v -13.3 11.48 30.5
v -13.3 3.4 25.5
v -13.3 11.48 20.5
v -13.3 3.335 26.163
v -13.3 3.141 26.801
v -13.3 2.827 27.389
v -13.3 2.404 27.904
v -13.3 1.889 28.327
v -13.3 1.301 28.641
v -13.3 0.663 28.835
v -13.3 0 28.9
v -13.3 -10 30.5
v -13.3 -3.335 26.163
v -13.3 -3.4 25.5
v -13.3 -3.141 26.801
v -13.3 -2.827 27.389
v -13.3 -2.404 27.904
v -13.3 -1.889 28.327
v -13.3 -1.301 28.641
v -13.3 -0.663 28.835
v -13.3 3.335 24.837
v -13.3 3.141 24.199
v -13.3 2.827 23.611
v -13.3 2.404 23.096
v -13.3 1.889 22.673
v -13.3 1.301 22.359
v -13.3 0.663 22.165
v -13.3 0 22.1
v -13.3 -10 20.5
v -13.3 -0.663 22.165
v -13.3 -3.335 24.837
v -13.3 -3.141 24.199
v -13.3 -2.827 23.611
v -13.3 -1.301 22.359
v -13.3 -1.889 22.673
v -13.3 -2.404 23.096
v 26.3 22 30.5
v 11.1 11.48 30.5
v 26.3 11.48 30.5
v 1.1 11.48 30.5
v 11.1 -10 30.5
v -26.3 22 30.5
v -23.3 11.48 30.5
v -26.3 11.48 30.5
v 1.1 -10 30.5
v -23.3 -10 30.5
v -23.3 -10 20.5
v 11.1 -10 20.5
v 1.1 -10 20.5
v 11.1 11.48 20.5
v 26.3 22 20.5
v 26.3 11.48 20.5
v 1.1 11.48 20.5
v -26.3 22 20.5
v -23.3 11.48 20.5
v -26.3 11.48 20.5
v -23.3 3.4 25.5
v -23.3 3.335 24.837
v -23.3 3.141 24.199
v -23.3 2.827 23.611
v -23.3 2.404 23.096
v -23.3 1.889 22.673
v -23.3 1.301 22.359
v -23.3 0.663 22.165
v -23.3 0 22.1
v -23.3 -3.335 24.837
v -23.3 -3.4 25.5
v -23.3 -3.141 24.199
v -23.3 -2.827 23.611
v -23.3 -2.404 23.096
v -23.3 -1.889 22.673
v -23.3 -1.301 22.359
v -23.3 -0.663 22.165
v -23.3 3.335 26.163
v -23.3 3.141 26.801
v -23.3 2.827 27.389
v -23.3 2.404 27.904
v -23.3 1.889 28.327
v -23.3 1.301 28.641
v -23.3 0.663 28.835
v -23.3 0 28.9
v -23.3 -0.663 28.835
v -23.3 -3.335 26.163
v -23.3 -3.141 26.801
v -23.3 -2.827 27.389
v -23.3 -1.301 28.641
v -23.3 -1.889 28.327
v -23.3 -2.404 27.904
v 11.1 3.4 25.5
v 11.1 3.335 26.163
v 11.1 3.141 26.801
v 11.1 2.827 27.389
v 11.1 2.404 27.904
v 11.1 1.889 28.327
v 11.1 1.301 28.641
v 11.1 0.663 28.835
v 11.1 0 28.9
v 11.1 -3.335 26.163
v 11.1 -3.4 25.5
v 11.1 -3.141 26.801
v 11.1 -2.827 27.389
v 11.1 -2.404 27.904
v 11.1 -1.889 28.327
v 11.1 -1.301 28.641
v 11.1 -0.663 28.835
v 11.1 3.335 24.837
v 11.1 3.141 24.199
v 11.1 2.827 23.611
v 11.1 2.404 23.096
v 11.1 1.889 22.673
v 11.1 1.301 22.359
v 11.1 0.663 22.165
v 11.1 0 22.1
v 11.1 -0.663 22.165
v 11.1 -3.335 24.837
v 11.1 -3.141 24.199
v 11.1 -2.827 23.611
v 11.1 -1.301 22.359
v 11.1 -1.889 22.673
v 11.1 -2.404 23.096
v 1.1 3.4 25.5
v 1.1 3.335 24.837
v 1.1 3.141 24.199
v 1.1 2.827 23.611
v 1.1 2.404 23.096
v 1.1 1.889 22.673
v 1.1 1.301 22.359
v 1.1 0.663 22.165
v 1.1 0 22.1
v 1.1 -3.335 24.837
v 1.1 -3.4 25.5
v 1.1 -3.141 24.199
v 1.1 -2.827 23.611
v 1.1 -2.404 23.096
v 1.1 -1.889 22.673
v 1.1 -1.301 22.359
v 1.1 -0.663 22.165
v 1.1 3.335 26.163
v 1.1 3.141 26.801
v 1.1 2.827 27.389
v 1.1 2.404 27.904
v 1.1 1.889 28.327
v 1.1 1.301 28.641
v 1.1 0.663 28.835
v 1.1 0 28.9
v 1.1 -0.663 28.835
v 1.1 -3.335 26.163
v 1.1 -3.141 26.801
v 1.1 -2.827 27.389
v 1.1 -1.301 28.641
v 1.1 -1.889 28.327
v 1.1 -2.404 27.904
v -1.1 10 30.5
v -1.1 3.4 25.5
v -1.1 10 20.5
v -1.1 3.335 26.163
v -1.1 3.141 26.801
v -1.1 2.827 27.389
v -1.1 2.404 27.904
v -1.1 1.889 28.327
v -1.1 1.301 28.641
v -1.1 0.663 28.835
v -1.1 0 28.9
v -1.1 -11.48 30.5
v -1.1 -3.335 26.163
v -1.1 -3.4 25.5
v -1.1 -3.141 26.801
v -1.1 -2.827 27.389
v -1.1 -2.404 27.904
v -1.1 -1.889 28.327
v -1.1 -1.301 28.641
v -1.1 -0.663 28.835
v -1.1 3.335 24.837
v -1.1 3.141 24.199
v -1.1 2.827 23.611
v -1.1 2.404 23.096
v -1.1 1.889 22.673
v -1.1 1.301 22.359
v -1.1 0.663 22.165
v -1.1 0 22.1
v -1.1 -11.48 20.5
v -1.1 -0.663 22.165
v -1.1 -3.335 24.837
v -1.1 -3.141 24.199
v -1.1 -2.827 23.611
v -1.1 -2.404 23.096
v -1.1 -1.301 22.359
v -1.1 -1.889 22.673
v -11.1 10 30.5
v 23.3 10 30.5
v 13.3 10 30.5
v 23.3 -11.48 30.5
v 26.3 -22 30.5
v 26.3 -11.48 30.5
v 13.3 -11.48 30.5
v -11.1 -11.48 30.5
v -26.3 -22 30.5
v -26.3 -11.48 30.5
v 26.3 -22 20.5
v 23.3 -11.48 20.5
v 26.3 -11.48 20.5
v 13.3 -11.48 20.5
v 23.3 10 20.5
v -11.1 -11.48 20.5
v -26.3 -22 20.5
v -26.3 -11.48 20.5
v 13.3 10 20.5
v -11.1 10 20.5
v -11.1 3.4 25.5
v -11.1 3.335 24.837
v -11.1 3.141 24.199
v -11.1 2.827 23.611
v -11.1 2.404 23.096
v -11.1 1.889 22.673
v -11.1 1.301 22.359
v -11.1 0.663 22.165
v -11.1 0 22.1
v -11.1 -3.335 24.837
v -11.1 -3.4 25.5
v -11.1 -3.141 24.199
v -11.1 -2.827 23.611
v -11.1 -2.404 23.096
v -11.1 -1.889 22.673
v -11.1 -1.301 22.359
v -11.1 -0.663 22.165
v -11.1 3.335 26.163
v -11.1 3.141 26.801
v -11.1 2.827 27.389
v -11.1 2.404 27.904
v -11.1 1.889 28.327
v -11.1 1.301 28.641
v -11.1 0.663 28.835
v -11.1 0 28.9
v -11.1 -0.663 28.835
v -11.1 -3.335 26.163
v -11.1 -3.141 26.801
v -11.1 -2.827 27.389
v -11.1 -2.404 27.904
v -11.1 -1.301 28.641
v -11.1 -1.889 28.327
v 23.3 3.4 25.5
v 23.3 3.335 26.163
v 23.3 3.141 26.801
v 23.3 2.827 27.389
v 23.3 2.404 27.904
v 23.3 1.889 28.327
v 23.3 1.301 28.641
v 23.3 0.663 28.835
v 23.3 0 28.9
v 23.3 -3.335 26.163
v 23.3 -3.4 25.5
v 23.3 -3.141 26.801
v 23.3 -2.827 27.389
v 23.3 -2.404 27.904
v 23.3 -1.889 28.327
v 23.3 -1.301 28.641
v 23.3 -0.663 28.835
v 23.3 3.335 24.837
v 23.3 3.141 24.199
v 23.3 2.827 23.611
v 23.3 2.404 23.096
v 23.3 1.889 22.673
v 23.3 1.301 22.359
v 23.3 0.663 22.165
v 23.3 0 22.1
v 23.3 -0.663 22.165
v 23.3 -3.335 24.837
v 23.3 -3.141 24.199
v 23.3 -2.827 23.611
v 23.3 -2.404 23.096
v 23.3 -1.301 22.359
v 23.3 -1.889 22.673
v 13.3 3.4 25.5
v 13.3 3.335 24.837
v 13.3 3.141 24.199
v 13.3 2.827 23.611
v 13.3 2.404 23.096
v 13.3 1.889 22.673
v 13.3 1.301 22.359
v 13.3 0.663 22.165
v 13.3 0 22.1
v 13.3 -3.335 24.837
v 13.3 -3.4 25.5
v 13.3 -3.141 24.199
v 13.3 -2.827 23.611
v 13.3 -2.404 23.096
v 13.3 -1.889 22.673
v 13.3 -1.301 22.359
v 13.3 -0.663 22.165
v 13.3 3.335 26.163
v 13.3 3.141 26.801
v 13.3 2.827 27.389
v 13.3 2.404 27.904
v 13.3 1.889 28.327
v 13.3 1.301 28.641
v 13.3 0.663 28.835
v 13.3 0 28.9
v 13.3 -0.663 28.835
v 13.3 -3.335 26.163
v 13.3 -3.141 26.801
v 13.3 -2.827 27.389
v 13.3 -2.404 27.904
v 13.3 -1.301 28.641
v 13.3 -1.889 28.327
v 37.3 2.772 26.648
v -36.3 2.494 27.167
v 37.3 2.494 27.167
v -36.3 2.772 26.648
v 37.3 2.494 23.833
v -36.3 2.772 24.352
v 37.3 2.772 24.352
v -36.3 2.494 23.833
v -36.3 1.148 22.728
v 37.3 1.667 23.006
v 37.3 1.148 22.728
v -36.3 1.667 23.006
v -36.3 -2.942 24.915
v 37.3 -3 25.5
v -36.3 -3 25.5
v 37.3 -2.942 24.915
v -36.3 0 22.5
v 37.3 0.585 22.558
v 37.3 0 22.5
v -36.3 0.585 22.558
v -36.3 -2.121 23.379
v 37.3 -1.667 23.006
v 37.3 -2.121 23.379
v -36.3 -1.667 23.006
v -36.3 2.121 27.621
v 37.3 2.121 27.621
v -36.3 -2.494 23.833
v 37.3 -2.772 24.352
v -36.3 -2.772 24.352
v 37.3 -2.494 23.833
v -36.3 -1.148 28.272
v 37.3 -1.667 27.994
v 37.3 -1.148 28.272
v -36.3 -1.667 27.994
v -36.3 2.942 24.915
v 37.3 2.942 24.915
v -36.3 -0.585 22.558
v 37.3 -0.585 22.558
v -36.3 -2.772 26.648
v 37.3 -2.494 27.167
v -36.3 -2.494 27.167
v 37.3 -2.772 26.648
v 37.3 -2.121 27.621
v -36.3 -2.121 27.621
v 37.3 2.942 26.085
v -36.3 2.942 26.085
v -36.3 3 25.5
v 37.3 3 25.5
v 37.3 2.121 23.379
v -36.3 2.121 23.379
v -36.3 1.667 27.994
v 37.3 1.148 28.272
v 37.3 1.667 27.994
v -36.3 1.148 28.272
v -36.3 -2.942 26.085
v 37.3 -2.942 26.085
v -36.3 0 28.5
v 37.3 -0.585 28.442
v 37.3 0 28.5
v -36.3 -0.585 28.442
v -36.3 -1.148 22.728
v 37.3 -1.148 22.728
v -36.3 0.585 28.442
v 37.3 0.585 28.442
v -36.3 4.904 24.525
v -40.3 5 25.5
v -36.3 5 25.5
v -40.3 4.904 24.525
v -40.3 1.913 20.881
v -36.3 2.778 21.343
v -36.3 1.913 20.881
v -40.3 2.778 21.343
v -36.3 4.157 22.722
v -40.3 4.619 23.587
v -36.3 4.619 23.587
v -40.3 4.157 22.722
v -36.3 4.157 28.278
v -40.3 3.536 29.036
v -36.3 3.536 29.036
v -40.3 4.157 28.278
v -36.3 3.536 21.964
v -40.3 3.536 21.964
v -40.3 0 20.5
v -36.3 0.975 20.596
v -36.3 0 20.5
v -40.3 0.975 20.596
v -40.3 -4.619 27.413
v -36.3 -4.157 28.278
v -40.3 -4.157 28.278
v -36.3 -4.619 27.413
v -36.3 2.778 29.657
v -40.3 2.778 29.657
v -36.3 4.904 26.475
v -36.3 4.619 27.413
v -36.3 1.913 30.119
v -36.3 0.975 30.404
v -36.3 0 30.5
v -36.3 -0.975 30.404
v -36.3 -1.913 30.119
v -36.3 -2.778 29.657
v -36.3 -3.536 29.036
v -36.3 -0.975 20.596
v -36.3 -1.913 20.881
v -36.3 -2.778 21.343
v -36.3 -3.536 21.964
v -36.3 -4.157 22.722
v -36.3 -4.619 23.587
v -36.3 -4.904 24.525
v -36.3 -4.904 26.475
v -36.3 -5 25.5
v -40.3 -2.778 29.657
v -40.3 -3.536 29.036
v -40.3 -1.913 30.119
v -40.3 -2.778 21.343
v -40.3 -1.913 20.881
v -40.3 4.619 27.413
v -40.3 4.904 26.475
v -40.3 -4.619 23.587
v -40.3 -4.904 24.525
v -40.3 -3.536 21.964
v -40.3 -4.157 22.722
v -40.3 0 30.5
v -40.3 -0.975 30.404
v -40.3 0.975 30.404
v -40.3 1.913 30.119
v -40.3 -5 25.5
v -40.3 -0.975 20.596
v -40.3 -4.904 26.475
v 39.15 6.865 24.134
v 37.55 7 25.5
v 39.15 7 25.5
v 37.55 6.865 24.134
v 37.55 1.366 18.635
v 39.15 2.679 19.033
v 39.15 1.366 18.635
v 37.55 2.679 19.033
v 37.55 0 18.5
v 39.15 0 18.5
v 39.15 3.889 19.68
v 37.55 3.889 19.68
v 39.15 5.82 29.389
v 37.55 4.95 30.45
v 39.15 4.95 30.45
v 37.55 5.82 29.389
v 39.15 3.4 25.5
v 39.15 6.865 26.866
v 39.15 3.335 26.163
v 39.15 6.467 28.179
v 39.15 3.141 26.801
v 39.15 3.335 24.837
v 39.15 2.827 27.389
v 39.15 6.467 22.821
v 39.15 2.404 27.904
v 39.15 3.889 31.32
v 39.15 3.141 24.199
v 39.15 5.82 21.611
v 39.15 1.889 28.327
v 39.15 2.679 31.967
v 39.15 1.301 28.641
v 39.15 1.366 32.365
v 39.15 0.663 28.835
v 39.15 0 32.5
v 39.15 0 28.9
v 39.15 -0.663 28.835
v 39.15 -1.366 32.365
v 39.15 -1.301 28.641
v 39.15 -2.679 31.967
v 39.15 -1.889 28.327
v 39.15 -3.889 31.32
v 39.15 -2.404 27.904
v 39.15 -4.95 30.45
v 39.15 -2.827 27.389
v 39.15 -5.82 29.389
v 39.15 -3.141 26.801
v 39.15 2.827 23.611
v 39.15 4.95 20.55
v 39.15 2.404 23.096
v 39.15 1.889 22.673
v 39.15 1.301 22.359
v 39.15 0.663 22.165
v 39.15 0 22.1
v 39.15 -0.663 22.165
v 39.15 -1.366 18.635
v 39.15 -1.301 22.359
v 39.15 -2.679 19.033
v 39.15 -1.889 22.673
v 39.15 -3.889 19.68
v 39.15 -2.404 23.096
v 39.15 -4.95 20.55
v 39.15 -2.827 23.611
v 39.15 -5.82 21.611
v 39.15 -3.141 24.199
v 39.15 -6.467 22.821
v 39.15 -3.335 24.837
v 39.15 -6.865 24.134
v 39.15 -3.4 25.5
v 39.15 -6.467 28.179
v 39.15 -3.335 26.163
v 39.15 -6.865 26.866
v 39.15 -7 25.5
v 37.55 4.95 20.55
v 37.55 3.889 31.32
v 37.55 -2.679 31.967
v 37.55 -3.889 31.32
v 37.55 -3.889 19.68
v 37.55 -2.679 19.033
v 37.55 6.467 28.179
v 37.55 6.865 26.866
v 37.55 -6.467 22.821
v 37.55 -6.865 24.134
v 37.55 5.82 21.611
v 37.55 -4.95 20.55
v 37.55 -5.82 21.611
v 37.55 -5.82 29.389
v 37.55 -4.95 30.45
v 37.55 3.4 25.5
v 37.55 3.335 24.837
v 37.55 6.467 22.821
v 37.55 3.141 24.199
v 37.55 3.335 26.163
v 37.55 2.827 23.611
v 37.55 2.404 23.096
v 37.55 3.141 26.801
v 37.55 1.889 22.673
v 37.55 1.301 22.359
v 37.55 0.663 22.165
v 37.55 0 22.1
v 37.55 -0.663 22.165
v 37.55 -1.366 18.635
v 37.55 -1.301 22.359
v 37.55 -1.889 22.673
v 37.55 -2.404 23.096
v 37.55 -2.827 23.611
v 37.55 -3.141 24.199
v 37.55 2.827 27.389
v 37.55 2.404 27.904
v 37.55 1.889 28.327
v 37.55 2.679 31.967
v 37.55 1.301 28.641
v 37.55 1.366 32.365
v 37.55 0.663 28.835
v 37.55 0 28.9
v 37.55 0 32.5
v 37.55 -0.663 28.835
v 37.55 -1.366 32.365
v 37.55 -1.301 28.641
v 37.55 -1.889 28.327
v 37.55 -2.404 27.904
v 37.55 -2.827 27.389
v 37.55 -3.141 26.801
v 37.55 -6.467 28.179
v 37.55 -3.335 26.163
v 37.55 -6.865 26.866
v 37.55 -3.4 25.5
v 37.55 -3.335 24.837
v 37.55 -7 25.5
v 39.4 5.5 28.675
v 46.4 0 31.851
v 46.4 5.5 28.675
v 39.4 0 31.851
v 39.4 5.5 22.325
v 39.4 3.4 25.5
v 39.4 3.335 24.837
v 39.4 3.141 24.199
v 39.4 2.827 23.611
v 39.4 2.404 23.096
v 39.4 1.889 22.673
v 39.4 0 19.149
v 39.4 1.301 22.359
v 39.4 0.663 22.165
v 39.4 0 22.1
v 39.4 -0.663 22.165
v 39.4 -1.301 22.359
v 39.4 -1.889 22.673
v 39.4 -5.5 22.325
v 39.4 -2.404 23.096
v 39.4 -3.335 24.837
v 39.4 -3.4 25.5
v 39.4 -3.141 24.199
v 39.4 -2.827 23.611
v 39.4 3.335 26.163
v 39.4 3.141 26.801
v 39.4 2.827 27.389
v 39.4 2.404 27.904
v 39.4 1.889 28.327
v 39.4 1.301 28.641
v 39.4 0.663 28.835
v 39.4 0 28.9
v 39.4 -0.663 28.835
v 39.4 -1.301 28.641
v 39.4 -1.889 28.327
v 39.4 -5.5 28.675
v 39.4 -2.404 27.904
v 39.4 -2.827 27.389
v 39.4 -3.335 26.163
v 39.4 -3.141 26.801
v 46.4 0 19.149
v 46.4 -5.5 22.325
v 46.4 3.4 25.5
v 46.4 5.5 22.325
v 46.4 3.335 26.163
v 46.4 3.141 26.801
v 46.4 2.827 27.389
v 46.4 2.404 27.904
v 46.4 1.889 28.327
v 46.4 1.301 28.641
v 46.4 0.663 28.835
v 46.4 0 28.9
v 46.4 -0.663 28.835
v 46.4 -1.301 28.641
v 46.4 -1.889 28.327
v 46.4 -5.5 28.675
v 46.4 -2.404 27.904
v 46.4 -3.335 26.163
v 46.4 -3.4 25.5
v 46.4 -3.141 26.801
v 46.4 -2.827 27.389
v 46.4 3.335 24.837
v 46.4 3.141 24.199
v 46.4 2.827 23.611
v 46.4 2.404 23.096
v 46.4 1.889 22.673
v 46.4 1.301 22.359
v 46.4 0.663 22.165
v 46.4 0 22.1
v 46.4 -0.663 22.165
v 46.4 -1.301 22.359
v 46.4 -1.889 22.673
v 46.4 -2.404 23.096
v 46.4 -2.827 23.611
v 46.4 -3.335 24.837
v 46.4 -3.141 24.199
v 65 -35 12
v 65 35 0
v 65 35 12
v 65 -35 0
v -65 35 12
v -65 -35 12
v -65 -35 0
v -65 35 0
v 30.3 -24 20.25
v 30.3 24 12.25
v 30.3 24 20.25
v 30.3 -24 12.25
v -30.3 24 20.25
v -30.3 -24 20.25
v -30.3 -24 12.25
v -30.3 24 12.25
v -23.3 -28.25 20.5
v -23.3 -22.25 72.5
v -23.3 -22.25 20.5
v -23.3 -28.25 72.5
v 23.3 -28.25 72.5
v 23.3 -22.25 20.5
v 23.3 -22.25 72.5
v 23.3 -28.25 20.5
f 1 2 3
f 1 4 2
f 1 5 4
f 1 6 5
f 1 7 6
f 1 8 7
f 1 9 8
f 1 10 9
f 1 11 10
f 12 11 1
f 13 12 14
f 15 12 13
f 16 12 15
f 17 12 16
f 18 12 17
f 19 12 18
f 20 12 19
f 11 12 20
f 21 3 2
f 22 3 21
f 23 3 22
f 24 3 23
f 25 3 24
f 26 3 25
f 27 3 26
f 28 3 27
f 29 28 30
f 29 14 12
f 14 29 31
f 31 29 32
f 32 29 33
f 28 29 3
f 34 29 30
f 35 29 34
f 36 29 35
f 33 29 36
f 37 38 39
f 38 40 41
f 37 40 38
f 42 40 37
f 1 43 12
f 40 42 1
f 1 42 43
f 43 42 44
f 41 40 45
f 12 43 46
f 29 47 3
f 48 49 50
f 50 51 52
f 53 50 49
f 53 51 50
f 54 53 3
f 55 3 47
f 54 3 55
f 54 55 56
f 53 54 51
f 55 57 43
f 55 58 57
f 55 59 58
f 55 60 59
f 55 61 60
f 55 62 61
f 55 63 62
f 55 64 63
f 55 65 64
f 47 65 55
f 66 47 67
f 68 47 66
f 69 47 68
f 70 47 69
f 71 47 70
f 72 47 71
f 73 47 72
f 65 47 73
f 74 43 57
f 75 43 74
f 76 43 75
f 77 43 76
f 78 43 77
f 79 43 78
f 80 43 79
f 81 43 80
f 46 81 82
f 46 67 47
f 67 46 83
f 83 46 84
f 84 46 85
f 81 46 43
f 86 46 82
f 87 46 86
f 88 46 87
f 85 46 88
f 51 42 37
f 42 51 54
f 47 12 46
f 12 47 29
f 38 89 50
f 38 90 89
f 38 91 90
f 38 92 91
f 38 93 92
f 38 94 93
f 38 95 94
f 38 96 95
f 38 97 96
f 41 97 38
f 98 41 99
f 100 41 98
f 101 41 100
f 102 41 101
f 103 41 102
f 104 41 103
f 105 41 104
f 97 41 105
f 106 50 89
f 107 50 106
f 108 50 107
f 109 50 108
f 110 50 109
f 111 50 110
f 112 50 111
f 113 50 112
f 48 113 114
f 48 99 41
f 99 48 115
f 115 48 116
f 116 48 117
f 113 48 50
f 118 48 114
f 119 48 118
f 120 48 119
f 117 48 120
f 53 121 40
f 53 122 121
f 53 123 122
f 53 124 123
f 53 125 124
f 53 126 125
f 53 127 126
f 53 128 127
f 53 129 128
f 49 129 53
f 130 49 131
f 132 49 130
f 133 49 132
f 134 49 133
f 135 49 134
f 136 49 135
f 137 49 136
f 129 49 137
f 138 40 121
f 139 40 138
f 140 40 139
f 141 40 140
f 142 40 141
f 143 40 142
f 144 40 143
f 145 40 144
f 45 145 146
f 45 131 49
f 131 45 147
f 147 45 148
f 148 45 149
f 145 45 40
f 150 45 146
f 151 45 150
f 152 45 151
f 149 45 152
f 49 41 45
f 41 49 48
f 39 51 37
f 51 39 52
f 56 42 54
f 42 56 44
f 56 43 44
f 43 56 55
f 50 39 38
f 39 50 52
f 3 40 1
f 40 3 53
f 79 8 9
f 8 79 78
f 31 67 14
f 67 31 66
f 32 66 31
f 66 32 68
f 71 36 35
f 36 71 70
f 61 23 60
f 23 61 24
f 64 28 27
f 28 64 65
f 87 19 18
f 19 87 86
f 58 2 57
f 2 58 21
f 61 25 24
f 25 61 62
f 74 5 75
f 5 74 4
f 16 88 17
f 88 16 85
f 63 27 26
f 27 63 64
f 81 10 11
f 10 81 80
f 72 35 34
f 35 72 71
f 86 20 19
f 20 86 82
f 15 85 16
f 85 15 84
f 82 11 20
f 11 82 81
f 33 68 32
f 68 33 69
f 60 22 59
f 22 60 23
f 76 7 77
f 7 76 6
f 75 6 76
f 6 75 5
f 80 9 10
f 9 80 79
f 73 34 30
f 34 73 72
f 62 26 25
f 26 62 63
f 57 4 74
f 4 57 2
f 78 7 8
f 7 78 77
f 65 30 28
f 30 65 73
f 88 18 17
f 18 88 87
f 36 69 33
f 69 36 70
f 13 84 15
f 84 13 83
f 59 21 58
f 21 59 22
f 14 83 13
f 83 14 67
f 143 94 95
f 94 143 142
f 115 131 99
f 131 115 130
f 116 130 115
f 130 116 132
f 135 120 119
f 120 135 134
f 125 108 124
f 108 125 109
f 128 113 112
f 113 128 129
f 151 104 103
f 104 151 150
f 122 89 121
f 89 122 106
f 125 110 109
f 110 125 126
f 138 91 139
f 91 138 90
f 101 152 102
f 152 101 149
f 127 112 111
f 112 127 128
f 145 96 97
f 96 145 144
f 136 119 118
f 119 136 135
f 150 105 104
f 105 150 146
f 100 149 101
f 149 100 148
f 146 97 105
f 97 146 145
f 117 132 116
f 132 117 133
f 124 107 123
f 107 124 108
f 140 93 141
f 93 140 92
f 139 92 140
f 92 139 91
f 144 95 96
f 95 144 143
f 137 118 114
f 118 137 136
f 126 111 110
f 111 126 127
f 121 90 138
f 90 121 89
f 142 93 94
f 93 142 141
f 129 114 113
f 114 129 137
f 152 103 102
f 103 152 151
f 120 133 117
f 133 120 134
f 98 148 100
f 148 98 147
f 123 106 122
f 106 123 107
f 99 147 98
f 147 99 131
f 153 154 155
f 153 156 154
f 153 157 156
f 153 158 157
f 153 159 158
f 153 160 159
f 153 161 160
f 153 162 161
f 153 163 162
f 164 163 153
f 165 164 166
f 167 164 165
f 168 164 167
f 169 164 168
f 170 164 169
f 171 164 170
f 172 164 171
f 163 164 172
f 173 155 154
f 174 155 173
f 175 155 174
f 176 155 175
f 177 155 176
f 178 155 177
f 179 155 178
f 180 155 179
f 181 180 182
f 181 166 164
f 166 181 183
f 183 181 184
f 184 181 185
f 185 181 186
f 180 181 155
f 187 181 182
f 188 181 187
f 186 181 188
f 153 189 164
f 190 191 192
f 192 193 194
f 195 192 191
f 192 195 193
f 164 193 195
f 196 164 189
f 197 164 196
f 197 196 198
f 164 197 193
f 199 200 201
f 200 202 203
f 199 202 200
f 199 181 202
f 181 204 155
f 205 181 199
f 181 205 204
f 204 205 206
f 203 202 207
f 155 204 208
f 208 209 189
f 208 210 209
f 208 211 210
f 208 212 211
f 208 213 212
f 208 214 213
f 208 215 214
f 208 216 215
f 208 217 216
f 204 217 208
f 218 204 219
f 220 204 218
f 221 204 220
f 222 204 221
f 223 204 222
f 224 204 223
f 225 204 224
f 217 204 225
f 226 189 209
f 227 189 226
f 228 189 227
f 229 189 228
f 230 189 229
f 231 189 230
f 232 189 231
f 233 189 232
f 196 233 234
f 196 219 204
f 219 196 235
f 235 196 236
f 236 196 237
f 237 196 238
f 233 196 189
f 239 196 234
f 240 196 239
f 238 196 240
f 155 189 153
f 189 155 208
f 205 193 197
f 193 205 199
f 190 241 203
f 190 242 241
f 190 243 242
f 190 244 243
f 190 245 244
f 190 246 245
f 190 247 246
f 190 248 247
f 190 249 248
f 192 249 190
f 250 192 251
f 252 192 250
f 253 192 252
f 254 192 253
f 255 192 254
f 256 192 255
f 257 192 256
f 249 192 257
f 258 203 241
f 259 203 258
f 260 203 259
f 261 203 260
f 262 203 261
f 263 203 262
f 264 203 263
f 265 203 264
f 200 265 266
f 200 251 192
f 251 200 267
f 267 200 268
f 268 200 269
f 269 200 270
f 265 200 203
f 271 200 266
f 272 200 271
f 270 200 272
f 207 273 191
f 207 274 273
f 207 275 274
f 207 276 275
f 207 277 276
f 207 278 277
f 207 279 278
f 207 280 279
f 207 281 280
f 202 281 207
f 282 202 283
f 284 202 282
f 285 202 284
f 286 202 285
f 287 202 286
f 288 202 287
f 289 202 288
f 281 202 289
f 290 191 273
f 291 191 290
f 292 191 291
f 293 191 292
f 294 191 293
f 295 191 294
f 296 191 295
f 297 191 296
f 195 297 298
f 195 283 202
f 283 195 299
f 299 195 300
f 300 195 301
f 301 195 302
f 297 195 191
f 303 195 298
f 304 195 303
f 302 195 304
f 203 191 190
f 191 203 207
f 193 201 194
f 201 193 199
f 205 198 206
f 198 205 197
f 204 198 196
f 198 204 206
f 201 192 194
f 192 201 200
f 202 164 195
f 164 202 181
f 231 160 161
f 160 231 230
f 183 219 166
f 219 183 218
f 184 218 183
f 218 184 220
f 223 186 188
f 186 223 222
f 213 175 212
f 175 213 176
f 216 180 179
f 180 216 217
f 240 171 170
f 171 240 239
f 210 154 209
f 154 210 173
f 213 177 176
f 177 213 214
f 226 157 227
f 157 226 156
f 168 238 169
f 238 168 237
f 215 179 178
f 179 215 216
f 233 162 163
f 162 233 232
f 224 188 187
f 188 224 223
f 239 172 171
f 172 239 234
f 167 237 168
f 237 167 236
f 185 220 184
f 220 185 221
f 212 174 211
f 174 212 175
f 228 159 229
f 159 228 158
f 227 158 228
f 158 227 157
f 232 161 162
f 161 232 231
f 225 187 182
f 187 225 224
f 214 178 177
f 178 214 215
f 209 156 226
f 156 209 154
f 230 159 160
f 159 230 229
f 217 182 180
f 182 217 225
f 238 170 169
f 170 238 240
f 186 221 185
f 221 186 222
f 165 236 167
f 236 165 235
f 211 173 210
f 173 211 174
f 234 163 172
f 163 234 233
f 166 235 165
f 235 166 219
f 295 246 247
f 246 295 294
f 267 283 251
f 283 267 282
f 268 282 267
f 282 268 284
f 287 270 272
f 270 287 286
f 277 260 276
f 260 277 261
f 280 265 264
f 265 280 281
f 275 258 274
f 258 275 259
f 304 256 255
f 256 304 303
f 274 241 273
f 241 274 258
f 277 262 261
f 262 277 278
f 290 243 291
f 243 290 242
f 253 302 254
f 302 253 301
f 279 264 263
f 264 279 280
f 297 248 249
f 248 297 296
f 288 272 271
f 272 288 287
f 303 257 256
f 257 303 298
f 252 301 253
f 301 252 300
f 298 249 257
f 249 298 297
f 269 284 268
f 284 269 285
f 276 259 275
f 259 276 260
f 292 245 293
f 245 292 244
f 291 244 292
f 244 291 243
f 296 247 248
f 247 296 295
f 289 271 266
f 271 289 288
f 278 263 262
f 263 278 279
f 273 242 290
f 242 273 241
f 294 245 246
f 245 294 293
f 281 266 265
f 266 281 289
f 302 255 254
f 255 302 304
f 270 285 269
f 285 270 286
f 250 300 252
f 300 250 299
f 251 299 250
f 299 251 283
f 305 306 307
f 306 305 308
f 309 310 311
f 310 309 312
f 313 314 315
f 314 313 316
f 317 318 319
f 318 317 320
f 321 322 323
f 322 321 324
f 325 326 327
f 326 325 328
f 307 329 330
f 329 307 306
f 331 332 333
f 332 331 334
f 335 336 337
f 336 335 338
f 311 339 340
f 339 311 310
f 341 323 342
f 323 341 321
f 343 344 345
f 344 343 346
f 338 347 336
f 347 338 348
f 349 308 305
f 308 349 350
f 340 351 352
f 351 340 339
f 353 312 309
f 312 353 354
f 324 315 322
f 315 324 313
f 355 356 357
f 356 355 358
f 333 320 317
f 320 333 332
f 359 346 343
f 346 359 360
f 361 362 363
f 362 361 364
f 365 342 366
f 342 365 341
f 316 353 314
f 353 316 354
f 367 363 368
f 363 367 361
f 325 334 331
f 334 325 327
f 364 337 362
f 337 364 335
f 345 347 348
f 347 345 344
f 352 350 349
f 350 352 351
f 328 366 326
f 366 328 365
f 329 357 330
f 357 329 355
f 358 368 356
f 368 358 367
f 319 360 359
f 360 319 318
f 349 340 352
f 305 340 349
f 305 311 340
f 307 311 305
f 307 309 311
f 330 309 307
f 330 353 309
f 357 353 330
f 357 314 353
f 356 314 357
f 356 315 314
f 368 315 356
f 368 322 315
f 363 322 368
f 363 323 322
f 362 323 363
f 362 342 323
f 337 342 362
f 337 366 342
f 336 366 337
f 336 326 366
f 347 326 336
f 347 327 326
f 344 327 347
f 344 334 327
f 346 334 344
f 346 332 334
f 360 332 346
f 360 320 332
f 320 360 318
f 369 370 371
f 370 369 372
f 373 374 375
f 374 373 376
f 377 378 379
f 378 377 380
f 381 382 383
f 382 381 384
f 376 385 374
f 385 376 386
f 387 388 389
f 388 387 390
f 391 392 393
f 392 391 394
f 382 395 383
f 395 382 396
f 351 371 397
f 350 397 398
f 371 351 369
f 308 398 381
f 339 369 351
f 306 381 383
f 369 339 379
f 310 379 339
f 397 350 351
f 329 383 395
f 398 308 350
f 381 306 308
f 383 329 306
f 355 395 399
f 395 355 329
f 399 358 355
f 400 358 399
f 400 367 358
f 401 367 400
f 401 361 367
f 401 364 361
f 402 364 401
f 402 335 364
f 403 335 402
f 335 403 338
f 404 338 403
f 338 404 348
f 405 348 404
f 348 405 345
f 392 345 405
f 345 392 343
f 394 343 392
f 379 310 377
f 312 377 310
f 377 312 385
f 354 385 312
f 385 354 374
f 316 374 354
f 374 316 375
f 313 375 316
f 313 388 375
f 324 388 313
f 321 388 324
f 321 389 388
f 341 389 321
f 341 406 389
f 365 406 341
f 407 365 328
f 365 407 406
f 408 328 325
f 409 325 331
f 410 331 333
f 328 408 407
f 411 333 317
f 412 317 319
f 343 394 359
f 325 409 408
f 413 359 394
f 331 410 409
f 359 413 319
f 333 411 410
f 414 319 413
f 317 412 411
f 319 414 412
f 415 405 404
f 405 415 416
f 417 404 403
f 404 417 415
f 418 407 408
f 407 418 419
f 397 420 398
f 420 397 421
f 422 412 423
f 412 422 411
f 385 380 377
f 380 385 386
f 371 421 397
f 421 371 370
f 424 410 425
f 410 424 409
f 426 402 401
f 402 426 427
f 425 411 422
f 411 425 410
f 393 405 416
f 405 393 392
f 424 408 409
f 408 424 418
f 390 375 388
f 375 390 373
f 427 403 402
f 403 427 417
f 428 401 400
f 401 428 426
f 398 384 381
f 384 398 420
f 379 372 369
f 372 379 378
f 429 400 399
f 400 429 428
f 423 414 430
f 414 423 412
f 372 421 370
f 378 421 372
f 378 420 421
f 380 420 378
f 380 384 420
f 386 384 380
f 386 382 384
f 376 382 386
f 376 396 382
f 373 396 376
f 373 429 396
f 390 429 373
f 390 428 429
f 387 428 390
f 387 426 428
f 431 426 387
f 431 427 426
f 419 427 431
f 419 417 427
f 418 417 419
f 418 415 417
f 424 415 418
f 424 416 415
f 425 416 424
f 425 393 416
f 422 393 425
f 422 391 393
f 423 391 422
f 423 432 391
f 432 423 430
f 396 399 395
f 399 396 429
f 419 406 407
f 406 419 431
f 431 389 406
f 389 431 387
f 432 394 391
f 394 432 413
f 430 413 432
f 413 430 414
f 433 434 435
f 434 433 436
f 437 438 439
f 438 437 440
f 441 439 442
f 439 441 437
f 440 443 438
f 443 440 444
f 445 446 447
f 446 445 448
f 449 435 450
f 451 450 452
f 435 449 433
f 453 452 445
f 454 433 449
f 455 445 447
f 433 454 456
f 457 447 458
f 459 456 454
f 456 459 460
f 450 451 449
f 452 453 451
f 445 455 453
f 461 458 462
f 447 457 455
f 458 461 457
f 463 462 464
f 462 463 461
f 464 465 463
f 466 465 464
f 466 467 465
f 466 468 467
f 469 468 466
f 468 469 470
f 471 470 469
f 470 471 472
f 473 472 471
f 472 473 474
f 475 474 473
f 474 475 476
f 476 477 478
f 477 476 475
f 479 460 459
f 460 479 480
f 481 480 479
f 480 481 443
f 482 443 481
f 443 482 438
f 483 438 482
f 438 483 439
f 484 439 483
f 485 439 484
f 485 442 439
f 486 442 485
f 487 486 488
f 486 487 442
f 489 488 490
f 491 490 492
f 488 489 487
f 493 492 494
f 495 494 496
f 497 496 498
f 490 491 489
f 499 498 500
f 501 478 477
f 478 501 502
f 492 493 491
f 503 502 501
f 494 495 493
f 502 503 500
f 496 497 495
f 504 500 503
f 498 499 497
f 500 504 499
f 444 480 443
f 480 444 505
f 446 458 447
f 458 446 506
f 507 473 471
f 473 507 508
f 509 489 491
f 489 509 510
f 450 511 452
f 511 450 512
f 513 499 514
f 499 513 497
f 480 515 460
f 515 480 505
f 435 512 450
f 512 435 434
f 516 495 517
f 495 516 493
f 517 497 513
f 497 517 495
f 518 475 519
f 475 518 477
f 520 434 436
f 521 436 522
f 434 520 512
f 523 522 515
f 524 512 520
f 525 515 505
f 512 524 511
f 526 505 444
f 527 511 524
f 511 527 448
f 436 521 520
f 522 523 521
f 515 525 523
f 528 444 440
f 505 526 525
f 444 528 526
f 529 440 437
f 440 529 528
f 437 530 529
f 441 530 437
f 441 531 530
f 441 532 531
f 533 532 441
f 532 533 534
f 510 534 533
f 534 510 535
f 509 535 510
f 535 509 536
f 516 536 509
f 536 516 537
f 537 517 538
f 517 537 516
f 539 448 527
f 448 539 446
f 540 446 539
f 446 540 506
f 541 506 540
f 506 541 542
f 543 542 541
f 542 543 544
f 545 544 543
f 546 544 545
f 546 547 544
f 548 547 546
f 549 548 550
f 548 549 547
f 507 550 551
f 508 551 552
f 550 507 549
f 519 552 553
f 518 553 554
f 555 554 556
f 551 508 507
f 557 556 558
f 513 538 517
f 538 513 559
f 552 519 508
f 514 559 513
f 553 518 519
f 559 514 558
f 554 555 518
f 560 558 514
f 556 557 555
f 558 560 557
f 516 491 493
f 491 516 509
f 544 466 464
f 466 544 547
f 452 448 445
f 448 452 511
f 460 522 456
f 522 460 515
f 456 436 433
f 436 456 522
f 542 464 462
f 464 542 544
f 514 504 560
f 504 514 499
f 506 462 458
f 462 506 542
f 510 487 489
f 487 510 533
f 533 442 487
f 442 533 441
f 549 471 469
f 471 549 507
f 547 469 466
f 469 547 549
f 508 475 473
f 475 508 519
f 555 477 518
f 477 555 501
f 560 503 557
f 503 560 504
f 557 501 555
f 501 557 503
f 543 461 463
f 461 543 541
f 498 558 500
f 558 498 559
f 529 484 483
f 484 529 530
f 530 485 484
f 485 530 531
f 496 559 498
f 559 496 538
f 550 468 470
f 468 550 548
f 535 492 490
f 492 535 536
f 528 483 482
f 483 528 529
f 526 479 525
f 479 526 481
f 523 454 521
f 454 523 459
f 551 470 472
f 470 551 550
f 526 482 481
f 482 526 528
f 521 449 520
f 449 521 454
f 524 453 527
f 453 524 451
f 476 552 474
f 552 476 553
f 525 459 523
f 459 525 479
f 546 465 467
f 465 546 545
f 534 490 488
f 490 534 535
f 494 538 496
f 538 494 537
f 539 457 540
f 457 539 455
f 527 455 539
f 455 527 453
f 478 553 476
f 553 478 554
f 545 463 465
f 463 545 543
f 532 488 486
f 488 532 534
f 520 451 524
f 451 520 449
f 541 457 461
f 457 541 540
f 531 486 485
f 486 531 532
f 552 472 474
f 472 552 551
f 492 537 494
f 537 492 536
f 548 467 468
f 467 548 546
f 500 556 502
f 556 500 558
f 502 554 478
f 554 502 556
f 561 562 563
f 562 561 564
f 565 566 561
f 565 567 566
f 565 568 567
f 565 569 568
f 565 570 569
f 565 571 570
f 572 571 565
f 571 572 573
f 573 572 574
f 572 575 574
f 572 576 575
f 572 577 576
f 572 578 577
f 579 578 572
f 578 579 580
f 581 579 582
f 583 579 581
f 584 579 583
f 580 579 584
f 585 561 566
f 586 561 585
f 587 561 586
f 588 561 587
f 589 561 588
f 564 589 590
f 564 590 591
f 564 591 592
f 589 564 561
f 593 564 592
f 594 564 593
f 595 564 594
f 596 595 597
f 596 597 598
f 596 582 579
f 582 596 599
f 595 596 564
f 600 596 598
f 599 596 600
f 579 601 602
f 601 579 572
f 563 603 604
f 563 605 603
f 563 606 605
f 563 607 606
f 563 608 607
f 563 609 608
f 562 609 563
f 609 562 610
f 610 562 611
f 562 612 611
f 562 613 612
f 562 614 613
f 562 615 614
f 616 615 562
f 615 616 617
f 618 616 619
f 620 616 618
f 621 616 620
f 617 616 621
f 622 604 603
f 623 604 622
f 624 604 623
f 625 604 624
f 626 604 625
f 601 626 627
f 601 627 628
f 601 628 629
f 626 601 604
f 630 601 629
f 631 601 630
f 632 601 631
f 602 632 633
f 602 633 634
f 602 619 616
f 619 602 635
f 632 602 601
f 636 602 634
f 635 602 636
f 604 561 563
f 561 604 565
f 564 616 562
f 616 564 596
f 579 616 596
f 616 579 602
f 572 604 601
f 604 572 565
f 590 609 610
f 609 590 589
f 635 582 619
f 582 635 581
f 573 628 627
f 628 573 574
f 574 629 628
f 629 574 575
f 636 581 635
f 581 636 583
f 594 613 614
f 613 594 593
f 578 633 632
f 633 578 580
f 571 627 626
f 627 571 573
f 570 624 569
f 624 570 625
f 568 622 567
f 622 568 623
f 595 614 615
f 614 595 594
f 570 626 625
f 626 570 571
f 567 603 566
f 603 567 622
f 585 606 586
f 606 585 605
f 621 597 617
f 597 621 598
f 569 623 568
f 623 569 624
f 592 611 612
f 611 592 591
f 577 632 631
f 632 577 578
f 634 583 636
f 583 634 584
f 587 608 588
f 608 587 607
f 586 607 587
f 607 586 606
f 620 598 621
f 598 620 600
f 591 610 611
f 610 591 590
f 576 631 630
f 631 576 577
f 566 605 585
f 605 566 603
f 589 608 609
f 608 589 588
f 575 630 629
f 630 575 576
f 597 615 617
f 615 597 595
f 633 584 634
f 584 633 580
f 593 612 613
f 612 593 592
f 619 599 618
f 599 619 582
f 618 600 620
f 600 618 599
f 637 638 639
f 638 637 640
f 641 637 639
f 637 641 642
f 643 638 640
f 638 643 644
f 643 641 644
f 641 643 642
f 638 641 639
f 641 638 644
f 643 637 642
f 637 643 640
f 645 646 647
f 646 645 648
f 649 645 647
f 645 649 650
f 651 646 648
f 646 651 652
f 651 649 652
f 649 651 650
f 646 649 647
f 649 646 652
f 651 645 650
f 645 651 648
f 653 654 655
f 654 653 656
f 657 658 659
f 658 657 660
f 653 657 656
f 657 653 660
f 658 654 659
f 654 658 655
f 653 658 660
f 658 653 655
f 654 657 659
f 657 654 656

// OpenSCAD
$fn = 32;

// ------------------------------------------------------------------------
// Comb hinge with flap: leaf 52.6 x 22 mm, pin d6, flap 52 mm
// Every part is its own module, assembly() places every instance.
// ------------------------------------------------------------------------

// --- part 1 ---
module hinge_bed() {
  difference() {
    translate([-65, -35, 0]) cube([130, 70, 12]);
  }
}

// --- part 2 ---
module hinge_riser() {
  difference() {
    translate([-30.3, -24, 0]) cube([60.6, 48, 8]);
  }
}

// --- part 3 ---
module hinge_leaf_a() {
  difference() {
    union() {
      translate([-23.3, -10, -5]) cube([10, 32, 10]);
      translate([1.1, -10, -5]) cube([10, 32, 10]);
      translate([-26.3, 11.48, -5]) cube([52.6, 10.52, 10]);
    }
    translate([-18.3, 0, 0]) rotate([0, 90, 0]) cylinder(h = 12, d = 6.8, center = true);
    translate([6.1, 0, 0]) rotate([0, 90, 0]) cylinder(h = 12, d = 6.8, center = true);
  }
}

// --- part 4 ---
module hinge_leaf_b() {
  difference() {
    union() {
      translate([-11.1, -22, -5]) cube([10, 32, 10]);
      translate([13.3, -22, -5]) cube([10, 32, 10]);
      translate([-26.3, -22, -5]) cube([52.6, 10.52, 10]);
    }
    translate([-6.1, 0, 0]) rotate([0, 90, 0]) cylinder(h = 12, d = 6.8, center = true);
    translate([18.3, 0, 0]) rotate([0, 90, 0]) cylinder(h = 12, d = 6.8, center = true);
  }
}

// --- part 5 ---
module hinge_flap() {
  difference() {
    translate([-23.3, -26, 0]) cube([46.6, 52, 6]);
  }
}

// --- part 6 ---
module hinge_pin() {
  rotate([0, 90, 0]) cylinder(h = 74.6, d = 6, center = true);
  translate([-40.3, 0, 0]) rotate([0, 90, 0]) cylinder(h = 4, d = 10);
}

// --- part 7 ---
module pin_washer() {
  difference() {
      translate([0, 0, 0]) cylinder(h = 1.6, d = 14);
      translate([0, 0, -1]) cylinder(h = 3.6, d = 6.8);
    }
}

// --- part 8 ---
module pin_nut() {
  difference() {
    linear_extrude(height = 7) polygon(points = [[6.351, 0], [3.175, 5.5], [-3.175, 5.5], [-6.351, 0], [-3.175, -5.5], [3.175, -5.5]]);
    translate([0, 0, -1]) cylinder(h = 9, d = 6.8);
  }
}

// --- assembly ---
module assembly() {
  color([0.80, 0.24, 0.20]) translate([0, 0, 0]) rotate([0, 0, 0]) hinge_bed();
  color([0.20, 0.45, 0.75]) translate([0, 0, 12.25]) rotate([0, 0, 0]) hinge_riser();
  color([0.25, 0.62, 0.32]) translate([0, 0, 25.5]) rotate([0, 0, 0]) hinge_leaf_a();
  color([0.92, 0.70, 0.18]) translate([0, 0, 25.5]) rotate([0, 0, 0]) hinge_leaf_b();
  color([0.58, 0.35, 0.70]) translate([0, -22.25, 46.5]) rotate([90, 0, 0]) hinge_flap();
  color([0.16, 0.66, 0.66]) translate([0, 0, 25.5]) rotate([0, 0, 0]) hinge_pin();
  color([0.85, 0.48, 0.18]) translate([37.55, 0, 25.5]) rotate([0, 90, 0]) pin_washer();
  color([0.55, 0.60, 0.65]) translate([39.4, 0, 25.5]) rotate([0, 90, 0]) pin_nut();
}

assembly();
